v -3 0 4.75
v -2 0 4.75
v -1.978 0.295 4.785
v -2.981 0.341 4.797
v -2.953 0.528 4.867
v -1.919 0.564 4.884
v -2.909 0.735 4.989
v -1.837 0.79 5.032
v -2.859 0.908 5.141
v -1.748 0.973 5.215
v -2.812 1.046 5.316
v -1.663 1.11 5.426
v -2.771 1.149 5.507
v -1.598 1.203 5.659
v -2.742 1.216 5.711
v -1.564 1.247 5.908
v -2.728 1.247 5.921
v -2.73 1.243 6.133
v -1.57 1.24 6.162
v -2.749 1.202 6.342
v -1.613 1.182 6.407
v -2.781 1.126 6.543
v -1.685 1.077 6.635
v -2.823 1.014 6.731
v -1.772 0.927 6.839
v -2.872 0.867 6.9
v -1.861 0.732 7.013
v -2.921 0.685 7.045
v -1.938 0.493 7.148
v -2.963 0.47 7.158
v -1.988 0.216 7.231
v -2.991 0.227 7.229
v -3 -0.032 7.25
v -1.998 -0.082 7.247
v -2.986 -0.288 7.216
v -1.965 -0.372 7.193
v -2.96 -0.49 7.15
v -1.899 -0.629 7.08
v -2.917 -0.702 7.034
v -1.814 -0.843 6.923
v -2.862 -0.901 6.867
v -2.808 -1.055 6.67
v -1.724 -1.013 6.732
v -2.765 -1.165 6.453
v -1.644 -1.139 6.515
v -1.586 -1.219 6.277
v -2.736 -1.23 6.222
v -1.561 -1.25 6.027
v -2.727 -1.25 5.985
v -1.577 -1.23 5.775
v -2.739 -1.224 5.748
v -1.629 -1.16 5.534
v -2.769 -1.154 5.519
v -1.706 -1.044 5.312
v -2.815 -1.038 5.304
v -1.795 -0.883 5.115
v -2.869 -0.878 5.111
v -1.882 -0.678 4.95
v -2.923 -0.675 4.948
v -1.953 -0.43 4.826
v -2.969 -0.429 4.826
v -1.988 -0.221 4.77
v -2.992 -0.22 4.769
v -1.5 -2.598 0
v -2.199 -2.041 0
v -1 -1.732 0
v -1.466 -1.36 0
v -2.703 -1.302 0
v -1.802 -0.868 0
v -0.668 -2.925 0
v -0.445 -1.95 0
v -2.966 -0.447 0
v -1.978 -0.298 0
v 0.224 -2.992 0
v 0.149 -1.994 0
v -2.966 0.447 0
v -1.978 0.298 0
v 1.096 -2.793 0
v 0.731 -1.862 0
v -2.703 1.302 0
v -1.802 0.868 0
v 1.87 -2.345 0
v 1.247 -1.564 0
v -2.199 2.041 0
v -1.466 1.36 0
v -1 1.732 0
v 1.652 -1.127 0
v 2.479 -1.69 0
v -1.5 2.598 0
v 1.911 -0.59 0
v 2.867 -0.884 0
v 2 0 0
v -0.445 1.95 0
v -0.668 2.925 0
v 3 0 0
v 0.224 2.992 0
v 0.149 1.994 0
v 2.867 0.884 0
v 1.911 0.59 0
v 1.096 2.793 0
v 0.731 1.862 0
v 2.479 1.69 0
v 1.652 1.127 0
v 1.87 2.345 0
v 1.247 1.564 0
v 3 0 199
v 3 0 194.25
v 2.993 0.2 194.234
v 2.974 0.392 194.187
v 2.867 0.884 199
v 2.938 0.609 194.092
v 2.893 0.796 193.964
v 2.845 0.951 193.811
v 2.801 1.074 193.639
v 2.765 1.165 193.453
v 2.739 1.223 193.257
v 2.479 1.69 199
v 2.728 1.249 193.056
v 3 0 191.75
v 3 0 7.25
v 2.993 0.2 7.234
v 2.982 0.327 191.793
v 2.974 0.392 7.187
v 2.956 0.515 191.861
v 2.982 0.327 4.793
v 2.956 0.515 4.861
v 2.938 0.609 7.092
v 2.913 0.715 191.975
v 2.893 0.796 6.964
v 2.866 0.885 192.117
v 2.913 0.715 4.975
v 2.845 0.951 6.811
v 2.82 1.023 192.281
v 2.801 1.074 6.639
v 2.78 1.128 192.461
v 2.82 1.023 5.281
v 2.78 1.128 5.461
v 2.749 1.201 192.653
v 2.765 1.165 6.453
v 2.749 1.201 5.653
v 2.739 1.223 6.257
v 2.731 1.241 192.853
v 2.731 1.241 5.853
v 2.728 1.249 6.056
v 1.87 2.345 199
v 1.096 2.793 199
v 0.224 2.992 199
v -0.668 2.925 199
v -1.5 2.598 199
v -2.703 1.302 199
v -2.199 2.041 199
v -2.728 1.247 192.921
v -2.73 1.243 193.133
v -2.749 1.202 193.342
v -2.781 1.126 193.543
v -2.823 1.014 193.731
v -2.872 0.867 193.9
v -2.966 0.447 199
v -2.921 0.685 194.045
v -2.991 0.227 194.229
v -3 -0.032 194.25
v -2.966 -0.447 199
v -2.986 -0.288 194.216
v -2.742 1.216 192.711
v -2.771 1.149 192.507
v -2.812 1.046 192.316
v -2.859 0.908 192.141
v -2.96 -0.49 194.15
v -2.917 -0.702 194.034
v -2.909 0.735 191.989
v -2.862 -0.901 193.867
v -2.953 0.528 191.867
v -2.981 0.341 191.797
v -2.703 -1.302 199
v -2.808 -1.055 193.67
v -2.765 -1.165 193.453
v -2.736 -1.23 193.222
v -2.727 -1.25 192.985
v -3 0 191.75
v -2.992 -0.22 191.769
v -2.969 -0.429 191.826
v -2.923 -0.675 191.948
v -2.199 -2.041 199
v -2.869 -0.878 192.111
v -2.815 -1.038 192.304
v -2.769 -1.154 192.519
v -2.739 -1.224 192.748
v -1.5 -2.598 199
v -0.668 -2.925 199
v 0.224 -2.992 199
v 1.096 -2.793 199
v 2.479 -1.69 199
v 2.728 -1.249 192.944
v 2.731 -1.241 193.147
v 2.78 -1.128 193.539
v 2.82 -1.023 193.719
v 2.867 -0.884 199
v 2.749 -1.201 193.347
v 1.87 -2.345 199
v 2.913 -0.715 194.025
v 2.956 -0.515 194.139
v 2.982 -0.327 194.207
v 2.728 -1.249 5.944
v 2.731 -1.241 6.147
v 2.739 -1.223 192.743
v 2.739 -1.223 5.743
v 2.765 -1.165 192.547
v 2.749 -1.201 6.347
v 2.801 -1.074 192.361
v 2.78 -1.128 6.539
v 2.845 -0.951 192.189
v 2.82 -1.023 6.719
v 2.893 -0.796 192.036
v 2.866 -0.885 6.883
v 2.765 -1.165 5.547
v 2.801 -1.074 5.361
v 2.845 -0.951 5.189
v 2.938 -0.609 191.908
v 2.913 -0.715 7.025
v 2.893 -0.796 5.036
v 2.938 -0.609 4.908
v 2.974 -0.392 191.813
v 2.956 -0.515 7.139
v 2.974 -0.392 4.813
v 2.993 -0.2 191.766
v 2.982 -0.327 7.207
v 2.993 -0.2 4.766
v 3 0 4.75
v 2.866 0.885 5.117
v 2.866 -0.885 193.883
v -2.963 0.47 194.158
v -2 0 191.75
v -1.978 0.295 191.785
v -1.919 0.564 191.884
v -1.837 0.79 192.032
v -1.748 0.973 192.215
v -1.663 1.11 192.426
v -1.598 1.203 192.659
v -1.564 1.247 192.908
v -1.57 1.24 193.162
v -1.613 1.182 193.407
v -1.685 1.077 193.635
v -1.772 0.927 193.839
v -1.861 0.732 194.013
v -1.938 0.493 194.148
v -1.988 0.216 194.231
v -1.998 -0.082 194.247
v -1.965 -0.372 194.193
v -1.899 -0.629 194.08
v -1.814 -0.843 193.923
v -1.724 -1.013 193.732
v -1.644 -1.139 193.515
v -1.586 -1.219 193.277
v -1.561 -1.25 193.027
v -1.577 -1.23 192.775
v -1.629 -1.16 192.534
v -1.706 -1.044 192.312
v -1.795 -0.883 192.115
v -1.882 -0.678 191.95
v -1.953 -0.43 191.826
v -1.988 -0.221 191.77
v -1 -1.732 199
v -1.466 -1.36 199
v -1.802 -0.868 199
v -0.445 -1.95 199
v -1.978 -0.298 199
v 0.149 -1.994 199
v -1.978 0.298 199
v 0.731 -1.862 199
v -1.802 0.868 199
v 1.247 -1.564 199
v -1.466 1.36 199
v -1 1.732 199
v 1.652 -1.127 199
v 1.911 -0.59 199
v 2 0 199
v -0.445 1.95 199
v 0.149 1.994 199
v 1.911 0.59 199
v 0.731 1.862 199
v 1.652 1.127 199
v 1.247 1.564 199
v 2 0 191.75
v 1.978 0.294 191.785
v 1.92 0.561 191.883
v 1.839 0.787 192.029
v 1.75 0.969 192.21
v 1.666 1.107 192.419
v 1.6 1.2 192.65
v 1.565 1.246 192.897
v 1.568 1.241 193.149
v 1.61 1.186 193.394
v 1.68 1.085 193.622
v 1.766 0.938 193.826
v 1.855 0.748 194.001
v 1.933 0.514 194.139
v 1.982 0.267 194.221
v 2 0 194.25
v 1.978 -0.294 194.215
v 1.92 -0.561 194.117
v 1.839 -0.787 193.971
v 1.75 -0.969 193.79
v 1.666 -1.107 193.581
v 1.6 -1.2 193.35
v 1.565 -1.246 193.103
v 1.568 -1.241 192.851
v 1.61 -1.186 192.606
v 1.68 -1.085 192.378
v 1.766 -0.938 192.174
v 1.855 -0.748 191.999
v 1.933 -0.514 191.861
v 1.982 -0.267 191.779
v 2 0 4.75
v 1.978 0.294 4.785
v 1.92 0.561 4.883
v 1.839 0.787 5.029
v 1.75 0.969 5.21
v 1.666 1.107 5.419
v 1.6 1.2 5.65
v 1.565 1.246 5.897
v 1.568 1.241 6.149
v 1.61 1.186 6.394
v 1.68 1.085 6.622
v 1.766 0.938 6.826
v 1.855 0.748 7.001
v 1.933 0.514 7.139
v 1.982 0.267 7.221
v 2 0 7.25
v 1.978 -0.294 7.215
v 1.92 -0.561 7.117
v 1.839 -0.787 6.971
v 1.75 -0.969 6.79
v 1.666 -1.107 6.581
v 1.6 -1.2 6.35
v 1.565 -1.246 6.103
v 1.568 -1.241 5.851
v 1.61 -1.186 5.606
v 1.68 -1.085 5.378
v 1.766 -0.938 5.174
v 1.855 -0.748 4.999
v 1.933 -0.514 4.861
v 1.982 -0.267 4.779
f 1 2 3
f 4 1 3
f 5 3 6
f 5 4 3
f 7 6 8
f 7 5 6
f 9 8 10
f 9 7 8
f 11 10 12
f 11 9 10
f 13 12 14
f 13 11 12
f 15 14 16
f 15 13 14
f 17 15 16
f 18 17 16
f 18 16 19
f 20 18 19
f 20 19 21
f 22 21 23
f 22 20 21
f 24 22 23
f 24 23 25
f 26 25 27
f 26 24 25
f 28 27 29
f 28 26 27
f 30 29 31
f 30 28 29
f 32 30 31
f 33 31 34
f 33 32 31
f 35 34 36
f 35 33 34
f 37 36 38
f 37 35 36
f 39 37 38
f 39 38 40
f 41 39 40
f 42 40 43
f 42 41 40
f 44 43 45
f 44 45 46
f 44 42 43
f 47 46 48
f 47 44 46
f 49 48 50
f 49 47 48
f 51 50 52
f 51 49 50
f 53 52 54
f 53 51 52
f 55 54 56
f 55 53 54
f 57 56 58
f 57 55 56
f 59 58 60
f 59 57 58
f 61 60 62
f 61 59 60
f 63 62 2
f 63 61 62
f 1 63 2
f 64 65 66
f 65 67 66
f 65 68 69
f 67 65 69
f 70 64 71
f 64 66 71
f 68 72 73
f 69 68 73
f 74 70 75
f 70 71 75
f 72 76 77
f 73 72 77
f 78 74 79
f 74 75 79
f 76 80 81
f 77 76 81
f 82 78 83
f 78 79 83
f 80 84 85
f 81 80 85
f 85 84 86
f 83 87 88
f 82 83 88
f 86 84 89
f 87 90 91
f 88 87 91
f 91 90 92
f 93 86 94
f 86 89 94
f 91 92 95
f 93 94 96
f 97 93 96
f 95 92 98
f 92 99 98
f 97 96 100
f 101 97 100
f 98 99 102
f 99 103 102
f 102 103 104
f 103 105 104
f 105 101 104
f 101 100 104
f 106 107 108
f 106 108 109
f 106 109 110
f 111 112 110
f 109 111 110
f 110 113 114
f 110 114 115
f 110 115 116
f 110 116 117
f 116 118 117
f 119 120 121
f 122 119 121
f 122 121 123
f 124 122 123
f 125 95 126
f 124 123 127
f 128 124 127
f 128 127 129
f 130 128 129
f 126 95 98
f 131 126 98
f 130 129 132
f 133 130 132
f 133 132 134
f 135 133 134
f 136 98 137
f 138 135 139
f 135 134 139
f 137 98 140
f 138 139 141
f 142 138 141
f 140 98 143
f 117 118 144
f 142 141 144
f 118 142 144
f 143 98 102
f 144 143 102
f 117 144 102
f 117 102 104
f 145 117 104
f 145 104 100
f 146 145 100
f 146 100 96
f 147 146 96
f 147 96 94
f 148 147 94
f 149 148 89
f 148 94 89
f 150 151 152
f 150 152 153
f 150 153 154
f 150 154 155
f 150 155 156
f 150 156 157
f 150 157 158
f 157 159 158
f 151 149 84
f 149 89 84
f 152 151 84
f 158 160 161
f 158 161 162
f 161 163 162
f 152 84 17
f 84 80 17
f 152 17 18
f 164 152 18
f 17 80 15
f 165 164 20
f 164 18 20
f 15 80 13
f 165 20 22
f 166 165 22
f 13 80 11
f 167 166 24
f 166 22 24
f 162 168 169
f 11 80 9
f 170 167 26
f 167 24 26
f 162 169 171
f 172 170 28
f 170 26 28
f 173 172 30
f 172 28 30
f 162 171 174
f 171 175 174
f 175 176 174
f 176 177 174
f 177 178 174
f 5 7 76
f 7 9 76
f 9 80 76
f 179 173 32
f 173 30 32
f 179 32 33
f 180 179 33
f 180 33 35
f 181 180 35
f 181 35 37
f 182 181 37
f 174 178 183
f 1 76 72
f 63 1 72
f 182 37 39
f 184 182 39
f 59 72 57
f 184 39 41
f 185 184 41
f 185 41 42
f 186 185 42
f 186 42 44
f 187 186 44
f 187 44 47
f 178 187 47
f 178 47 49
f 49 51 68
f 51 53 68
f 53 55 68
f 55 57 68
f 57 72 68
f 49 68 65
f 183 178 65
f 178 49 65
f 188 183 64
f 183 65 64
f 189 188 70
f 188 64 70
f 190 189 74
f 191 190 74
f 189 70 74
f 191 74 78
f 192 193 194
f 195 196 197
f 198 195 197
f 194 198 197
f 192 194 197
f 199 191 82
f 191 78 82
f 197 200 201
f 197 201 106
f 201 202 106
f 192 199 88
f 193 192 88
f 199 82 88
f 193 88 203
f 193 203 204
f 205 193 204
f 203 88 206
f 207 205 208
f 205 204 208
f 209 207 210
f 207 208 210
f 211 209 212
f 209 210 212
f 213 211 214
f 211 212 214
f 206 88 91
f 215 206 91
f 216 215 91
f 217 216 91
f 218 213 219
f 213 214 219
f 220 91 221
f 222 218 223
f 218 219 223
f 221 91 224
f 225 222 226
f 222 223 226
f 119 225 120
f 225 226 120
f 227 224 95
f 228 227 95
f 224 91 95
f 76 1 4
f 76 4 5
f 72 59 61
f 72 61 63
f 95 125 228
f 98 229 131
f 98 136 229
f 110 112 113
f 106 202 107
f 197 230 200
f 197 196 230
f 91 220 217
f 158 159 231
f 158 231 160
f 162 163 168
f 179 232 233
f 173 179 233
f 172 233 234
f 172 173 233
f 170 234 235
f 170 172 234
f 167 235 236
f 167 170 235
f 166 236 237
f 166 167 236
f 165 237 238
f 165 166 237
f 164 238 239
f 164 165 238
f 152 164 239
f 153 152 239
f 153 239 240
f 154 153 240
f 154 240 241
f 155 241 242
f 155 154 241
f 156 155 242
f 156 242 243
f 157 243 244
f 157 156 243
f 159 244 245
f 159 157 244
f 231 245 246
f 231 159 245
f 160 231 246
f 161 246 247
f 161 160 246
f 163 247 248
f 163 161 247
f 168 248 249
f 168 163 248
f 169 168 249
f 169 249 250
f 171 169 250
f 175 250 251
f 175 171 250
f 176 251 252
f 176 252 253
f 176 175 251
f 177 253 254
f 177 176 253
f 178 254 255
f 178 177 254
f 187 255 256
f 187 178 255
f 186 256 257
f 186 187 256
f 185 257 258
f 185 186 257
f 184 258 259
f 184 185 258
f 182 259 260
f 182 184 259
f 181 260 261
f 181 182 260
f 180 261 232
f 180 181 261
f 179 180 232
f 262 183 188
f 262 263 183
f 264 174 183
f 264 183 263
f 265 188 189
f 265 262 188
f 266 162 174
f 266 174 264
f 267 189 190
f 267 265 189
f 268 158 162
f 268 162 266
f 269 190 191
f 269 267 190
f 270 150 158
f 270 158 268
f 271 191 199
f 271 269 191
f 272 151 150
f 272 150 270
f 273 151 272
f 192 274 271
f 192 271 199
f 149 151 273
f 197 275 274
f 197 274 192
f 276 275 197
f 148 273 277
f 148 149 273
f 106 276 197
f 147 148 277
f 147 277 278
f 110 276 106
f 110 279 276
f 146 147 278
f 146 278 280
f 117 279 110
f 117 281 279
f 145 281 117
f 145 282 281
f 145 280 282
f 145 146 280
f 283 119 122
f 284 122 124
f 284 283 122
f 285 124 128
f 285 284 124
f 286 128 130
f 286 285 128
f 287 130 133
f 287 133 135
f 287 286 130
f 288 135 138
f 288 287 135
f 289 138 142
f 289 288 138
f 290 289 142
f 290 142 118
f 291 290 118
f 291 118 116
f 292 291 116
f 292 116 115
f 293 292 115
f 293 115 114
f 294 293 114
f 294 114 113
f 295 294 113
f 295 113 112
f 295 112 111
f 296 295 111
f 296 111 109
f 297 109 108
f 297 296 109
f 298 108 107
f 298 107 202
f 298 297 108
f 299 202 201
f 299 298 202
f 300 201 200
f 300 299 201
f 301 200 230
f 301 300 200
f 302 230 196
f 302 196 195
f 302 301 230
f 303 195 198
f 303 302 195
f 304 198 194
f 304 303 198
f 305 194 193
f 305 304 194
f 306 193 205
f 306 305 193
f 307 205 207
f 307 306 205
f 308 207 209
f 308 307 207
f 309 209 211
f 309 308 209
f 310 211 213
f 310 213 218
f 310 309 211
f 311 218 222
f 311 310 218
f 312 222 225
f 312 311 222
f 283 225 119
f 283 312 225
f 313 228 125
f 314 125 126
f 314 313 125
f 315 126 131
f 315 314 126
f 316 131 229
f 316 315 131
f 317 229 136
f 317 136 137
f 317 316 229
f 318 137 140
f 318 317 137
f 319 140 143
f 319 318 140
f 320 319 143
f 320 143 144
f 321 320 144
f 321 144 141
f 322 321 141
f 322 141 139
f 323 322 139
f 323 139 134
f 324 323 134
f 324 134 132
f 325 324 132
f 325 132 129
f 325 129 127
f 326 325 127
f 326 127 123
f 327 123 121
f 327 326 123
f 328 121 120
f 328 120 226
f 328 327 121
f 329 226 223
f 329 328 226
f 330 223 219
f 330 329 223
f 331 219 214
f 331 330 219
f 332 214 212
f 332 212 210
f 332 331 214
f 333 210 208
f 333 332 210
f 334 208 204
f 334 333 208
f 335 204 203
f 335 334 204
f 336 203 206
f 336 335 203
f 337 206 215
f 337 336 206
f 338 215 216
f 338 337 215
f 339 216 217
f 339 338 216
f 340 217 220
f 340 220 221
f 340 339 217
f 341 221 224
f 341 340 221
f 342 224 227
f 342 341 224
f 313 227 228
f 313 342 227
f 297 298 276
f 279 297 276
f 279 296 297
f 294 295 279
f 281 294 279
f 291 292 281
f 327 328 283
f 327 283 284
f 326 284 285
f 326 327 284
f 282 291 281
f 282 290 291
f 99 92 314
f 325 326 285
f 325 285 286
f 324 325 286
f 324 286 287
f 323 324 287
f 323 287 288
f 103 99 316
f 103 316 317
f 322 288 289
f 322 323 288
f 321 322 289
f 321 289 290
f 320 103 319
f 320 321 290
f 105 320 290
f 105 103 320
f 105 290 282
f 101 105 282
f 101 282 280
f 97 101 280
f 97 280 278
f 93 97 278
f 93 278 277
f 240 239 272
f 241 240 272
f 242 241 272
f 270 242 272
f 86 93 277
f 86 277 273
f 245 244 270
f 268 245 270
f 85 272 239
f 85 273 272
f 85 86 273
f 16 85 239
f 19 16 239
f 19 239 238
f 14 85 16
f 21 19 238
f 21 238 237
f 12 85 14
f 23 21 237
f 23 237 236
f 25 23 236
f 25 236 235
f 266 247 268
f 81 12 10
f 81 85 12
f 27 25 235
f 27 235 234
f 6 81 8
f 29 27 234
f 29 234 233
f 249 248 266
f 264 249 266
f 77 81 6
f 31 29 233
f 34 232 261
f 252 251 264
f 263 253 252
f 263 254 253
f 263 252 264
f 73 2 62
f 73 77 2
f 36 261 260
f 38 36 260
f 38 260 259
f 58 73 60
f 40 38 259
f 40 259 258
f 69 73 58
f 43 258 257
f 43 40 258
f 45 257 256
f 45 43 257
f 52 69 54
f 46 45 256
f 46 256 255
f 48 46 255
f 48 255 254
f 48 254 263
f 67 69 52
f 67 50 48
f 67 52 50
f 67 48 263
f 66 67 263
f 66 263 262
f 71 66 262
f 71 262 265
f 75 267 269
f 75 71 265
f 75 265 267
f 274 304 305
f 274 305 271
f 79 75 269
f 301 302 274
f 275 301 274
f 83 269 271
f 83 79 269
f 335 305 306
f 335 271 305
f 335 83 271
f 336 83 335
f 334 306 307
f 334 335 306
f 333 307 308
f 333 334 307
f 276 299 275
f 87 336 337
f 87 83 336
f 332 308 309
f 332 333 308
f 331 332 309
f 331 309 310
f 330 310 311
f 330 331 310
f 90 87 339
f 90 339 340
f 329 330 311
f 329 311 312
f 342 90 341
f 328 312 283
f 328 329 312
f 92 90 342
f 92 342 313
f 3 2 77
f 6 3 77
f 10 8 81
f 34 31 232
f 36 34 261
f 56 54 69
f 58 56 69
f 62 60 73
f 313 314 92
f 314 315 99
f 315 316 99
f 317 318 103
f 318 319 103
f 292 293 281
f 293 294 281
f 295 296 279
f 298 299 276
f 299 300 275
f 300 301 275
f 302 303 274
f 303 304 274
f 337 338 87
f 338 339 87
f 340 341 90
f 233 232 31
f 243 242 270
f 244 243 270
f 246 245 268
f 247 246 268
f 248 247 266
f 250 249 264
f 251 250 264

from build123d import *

# Parameters (mm, degrees)
ESQUISSE1_R                  = 3
ESQUISSE1_R_2                = 2
BOSS_EXTRU_1_DEPTH           = 199
ENL_V_MAT_EXTRU_1_DEPTH      = 200.045220993
ENL_V_MAT_EXTRU_1_DEPTH_BACK = 200.045220993
ESQUISSE2_R                  = 1.25


with BuildPart() as part:
    # Esquisse1 → Boss.-Extru.1 (new body)
    with BuildSketch(Plane.XY):
        Circle(ESQUISSE1_R)
        Circle(ESQUISSE1_R_2, mode=Mode.SUBTRACT)
    extrude(amount=BOSS_EXTRU_1_DEPTH)

    # Esquisse2 → Enlèv. mat.-Extru.1 (cut, two sides: drawn at the far end of the back side and taken through both)
    with BuildSketch(Plane(origin=(0, 0, 0), x_dir=(0, 0, -1), z_dir=(1, 0, 0)).offset(-ENL_V_MAT_EXTRU_1_DEPTH_BACK)):
        with Locations((-6, 0)):
            Circle(ESQUISSE2_R)
        with Locations((-193, 0)):
            Circle(ESQUISSE2_R)
    extrude(amount=ENL_V_MAT_EXTRU_1_DEPTH + ENL_V_MAT_EXTRU_1_DEPTH_BACK, mode=Mode.SUBTRACT)


solid = part.part
